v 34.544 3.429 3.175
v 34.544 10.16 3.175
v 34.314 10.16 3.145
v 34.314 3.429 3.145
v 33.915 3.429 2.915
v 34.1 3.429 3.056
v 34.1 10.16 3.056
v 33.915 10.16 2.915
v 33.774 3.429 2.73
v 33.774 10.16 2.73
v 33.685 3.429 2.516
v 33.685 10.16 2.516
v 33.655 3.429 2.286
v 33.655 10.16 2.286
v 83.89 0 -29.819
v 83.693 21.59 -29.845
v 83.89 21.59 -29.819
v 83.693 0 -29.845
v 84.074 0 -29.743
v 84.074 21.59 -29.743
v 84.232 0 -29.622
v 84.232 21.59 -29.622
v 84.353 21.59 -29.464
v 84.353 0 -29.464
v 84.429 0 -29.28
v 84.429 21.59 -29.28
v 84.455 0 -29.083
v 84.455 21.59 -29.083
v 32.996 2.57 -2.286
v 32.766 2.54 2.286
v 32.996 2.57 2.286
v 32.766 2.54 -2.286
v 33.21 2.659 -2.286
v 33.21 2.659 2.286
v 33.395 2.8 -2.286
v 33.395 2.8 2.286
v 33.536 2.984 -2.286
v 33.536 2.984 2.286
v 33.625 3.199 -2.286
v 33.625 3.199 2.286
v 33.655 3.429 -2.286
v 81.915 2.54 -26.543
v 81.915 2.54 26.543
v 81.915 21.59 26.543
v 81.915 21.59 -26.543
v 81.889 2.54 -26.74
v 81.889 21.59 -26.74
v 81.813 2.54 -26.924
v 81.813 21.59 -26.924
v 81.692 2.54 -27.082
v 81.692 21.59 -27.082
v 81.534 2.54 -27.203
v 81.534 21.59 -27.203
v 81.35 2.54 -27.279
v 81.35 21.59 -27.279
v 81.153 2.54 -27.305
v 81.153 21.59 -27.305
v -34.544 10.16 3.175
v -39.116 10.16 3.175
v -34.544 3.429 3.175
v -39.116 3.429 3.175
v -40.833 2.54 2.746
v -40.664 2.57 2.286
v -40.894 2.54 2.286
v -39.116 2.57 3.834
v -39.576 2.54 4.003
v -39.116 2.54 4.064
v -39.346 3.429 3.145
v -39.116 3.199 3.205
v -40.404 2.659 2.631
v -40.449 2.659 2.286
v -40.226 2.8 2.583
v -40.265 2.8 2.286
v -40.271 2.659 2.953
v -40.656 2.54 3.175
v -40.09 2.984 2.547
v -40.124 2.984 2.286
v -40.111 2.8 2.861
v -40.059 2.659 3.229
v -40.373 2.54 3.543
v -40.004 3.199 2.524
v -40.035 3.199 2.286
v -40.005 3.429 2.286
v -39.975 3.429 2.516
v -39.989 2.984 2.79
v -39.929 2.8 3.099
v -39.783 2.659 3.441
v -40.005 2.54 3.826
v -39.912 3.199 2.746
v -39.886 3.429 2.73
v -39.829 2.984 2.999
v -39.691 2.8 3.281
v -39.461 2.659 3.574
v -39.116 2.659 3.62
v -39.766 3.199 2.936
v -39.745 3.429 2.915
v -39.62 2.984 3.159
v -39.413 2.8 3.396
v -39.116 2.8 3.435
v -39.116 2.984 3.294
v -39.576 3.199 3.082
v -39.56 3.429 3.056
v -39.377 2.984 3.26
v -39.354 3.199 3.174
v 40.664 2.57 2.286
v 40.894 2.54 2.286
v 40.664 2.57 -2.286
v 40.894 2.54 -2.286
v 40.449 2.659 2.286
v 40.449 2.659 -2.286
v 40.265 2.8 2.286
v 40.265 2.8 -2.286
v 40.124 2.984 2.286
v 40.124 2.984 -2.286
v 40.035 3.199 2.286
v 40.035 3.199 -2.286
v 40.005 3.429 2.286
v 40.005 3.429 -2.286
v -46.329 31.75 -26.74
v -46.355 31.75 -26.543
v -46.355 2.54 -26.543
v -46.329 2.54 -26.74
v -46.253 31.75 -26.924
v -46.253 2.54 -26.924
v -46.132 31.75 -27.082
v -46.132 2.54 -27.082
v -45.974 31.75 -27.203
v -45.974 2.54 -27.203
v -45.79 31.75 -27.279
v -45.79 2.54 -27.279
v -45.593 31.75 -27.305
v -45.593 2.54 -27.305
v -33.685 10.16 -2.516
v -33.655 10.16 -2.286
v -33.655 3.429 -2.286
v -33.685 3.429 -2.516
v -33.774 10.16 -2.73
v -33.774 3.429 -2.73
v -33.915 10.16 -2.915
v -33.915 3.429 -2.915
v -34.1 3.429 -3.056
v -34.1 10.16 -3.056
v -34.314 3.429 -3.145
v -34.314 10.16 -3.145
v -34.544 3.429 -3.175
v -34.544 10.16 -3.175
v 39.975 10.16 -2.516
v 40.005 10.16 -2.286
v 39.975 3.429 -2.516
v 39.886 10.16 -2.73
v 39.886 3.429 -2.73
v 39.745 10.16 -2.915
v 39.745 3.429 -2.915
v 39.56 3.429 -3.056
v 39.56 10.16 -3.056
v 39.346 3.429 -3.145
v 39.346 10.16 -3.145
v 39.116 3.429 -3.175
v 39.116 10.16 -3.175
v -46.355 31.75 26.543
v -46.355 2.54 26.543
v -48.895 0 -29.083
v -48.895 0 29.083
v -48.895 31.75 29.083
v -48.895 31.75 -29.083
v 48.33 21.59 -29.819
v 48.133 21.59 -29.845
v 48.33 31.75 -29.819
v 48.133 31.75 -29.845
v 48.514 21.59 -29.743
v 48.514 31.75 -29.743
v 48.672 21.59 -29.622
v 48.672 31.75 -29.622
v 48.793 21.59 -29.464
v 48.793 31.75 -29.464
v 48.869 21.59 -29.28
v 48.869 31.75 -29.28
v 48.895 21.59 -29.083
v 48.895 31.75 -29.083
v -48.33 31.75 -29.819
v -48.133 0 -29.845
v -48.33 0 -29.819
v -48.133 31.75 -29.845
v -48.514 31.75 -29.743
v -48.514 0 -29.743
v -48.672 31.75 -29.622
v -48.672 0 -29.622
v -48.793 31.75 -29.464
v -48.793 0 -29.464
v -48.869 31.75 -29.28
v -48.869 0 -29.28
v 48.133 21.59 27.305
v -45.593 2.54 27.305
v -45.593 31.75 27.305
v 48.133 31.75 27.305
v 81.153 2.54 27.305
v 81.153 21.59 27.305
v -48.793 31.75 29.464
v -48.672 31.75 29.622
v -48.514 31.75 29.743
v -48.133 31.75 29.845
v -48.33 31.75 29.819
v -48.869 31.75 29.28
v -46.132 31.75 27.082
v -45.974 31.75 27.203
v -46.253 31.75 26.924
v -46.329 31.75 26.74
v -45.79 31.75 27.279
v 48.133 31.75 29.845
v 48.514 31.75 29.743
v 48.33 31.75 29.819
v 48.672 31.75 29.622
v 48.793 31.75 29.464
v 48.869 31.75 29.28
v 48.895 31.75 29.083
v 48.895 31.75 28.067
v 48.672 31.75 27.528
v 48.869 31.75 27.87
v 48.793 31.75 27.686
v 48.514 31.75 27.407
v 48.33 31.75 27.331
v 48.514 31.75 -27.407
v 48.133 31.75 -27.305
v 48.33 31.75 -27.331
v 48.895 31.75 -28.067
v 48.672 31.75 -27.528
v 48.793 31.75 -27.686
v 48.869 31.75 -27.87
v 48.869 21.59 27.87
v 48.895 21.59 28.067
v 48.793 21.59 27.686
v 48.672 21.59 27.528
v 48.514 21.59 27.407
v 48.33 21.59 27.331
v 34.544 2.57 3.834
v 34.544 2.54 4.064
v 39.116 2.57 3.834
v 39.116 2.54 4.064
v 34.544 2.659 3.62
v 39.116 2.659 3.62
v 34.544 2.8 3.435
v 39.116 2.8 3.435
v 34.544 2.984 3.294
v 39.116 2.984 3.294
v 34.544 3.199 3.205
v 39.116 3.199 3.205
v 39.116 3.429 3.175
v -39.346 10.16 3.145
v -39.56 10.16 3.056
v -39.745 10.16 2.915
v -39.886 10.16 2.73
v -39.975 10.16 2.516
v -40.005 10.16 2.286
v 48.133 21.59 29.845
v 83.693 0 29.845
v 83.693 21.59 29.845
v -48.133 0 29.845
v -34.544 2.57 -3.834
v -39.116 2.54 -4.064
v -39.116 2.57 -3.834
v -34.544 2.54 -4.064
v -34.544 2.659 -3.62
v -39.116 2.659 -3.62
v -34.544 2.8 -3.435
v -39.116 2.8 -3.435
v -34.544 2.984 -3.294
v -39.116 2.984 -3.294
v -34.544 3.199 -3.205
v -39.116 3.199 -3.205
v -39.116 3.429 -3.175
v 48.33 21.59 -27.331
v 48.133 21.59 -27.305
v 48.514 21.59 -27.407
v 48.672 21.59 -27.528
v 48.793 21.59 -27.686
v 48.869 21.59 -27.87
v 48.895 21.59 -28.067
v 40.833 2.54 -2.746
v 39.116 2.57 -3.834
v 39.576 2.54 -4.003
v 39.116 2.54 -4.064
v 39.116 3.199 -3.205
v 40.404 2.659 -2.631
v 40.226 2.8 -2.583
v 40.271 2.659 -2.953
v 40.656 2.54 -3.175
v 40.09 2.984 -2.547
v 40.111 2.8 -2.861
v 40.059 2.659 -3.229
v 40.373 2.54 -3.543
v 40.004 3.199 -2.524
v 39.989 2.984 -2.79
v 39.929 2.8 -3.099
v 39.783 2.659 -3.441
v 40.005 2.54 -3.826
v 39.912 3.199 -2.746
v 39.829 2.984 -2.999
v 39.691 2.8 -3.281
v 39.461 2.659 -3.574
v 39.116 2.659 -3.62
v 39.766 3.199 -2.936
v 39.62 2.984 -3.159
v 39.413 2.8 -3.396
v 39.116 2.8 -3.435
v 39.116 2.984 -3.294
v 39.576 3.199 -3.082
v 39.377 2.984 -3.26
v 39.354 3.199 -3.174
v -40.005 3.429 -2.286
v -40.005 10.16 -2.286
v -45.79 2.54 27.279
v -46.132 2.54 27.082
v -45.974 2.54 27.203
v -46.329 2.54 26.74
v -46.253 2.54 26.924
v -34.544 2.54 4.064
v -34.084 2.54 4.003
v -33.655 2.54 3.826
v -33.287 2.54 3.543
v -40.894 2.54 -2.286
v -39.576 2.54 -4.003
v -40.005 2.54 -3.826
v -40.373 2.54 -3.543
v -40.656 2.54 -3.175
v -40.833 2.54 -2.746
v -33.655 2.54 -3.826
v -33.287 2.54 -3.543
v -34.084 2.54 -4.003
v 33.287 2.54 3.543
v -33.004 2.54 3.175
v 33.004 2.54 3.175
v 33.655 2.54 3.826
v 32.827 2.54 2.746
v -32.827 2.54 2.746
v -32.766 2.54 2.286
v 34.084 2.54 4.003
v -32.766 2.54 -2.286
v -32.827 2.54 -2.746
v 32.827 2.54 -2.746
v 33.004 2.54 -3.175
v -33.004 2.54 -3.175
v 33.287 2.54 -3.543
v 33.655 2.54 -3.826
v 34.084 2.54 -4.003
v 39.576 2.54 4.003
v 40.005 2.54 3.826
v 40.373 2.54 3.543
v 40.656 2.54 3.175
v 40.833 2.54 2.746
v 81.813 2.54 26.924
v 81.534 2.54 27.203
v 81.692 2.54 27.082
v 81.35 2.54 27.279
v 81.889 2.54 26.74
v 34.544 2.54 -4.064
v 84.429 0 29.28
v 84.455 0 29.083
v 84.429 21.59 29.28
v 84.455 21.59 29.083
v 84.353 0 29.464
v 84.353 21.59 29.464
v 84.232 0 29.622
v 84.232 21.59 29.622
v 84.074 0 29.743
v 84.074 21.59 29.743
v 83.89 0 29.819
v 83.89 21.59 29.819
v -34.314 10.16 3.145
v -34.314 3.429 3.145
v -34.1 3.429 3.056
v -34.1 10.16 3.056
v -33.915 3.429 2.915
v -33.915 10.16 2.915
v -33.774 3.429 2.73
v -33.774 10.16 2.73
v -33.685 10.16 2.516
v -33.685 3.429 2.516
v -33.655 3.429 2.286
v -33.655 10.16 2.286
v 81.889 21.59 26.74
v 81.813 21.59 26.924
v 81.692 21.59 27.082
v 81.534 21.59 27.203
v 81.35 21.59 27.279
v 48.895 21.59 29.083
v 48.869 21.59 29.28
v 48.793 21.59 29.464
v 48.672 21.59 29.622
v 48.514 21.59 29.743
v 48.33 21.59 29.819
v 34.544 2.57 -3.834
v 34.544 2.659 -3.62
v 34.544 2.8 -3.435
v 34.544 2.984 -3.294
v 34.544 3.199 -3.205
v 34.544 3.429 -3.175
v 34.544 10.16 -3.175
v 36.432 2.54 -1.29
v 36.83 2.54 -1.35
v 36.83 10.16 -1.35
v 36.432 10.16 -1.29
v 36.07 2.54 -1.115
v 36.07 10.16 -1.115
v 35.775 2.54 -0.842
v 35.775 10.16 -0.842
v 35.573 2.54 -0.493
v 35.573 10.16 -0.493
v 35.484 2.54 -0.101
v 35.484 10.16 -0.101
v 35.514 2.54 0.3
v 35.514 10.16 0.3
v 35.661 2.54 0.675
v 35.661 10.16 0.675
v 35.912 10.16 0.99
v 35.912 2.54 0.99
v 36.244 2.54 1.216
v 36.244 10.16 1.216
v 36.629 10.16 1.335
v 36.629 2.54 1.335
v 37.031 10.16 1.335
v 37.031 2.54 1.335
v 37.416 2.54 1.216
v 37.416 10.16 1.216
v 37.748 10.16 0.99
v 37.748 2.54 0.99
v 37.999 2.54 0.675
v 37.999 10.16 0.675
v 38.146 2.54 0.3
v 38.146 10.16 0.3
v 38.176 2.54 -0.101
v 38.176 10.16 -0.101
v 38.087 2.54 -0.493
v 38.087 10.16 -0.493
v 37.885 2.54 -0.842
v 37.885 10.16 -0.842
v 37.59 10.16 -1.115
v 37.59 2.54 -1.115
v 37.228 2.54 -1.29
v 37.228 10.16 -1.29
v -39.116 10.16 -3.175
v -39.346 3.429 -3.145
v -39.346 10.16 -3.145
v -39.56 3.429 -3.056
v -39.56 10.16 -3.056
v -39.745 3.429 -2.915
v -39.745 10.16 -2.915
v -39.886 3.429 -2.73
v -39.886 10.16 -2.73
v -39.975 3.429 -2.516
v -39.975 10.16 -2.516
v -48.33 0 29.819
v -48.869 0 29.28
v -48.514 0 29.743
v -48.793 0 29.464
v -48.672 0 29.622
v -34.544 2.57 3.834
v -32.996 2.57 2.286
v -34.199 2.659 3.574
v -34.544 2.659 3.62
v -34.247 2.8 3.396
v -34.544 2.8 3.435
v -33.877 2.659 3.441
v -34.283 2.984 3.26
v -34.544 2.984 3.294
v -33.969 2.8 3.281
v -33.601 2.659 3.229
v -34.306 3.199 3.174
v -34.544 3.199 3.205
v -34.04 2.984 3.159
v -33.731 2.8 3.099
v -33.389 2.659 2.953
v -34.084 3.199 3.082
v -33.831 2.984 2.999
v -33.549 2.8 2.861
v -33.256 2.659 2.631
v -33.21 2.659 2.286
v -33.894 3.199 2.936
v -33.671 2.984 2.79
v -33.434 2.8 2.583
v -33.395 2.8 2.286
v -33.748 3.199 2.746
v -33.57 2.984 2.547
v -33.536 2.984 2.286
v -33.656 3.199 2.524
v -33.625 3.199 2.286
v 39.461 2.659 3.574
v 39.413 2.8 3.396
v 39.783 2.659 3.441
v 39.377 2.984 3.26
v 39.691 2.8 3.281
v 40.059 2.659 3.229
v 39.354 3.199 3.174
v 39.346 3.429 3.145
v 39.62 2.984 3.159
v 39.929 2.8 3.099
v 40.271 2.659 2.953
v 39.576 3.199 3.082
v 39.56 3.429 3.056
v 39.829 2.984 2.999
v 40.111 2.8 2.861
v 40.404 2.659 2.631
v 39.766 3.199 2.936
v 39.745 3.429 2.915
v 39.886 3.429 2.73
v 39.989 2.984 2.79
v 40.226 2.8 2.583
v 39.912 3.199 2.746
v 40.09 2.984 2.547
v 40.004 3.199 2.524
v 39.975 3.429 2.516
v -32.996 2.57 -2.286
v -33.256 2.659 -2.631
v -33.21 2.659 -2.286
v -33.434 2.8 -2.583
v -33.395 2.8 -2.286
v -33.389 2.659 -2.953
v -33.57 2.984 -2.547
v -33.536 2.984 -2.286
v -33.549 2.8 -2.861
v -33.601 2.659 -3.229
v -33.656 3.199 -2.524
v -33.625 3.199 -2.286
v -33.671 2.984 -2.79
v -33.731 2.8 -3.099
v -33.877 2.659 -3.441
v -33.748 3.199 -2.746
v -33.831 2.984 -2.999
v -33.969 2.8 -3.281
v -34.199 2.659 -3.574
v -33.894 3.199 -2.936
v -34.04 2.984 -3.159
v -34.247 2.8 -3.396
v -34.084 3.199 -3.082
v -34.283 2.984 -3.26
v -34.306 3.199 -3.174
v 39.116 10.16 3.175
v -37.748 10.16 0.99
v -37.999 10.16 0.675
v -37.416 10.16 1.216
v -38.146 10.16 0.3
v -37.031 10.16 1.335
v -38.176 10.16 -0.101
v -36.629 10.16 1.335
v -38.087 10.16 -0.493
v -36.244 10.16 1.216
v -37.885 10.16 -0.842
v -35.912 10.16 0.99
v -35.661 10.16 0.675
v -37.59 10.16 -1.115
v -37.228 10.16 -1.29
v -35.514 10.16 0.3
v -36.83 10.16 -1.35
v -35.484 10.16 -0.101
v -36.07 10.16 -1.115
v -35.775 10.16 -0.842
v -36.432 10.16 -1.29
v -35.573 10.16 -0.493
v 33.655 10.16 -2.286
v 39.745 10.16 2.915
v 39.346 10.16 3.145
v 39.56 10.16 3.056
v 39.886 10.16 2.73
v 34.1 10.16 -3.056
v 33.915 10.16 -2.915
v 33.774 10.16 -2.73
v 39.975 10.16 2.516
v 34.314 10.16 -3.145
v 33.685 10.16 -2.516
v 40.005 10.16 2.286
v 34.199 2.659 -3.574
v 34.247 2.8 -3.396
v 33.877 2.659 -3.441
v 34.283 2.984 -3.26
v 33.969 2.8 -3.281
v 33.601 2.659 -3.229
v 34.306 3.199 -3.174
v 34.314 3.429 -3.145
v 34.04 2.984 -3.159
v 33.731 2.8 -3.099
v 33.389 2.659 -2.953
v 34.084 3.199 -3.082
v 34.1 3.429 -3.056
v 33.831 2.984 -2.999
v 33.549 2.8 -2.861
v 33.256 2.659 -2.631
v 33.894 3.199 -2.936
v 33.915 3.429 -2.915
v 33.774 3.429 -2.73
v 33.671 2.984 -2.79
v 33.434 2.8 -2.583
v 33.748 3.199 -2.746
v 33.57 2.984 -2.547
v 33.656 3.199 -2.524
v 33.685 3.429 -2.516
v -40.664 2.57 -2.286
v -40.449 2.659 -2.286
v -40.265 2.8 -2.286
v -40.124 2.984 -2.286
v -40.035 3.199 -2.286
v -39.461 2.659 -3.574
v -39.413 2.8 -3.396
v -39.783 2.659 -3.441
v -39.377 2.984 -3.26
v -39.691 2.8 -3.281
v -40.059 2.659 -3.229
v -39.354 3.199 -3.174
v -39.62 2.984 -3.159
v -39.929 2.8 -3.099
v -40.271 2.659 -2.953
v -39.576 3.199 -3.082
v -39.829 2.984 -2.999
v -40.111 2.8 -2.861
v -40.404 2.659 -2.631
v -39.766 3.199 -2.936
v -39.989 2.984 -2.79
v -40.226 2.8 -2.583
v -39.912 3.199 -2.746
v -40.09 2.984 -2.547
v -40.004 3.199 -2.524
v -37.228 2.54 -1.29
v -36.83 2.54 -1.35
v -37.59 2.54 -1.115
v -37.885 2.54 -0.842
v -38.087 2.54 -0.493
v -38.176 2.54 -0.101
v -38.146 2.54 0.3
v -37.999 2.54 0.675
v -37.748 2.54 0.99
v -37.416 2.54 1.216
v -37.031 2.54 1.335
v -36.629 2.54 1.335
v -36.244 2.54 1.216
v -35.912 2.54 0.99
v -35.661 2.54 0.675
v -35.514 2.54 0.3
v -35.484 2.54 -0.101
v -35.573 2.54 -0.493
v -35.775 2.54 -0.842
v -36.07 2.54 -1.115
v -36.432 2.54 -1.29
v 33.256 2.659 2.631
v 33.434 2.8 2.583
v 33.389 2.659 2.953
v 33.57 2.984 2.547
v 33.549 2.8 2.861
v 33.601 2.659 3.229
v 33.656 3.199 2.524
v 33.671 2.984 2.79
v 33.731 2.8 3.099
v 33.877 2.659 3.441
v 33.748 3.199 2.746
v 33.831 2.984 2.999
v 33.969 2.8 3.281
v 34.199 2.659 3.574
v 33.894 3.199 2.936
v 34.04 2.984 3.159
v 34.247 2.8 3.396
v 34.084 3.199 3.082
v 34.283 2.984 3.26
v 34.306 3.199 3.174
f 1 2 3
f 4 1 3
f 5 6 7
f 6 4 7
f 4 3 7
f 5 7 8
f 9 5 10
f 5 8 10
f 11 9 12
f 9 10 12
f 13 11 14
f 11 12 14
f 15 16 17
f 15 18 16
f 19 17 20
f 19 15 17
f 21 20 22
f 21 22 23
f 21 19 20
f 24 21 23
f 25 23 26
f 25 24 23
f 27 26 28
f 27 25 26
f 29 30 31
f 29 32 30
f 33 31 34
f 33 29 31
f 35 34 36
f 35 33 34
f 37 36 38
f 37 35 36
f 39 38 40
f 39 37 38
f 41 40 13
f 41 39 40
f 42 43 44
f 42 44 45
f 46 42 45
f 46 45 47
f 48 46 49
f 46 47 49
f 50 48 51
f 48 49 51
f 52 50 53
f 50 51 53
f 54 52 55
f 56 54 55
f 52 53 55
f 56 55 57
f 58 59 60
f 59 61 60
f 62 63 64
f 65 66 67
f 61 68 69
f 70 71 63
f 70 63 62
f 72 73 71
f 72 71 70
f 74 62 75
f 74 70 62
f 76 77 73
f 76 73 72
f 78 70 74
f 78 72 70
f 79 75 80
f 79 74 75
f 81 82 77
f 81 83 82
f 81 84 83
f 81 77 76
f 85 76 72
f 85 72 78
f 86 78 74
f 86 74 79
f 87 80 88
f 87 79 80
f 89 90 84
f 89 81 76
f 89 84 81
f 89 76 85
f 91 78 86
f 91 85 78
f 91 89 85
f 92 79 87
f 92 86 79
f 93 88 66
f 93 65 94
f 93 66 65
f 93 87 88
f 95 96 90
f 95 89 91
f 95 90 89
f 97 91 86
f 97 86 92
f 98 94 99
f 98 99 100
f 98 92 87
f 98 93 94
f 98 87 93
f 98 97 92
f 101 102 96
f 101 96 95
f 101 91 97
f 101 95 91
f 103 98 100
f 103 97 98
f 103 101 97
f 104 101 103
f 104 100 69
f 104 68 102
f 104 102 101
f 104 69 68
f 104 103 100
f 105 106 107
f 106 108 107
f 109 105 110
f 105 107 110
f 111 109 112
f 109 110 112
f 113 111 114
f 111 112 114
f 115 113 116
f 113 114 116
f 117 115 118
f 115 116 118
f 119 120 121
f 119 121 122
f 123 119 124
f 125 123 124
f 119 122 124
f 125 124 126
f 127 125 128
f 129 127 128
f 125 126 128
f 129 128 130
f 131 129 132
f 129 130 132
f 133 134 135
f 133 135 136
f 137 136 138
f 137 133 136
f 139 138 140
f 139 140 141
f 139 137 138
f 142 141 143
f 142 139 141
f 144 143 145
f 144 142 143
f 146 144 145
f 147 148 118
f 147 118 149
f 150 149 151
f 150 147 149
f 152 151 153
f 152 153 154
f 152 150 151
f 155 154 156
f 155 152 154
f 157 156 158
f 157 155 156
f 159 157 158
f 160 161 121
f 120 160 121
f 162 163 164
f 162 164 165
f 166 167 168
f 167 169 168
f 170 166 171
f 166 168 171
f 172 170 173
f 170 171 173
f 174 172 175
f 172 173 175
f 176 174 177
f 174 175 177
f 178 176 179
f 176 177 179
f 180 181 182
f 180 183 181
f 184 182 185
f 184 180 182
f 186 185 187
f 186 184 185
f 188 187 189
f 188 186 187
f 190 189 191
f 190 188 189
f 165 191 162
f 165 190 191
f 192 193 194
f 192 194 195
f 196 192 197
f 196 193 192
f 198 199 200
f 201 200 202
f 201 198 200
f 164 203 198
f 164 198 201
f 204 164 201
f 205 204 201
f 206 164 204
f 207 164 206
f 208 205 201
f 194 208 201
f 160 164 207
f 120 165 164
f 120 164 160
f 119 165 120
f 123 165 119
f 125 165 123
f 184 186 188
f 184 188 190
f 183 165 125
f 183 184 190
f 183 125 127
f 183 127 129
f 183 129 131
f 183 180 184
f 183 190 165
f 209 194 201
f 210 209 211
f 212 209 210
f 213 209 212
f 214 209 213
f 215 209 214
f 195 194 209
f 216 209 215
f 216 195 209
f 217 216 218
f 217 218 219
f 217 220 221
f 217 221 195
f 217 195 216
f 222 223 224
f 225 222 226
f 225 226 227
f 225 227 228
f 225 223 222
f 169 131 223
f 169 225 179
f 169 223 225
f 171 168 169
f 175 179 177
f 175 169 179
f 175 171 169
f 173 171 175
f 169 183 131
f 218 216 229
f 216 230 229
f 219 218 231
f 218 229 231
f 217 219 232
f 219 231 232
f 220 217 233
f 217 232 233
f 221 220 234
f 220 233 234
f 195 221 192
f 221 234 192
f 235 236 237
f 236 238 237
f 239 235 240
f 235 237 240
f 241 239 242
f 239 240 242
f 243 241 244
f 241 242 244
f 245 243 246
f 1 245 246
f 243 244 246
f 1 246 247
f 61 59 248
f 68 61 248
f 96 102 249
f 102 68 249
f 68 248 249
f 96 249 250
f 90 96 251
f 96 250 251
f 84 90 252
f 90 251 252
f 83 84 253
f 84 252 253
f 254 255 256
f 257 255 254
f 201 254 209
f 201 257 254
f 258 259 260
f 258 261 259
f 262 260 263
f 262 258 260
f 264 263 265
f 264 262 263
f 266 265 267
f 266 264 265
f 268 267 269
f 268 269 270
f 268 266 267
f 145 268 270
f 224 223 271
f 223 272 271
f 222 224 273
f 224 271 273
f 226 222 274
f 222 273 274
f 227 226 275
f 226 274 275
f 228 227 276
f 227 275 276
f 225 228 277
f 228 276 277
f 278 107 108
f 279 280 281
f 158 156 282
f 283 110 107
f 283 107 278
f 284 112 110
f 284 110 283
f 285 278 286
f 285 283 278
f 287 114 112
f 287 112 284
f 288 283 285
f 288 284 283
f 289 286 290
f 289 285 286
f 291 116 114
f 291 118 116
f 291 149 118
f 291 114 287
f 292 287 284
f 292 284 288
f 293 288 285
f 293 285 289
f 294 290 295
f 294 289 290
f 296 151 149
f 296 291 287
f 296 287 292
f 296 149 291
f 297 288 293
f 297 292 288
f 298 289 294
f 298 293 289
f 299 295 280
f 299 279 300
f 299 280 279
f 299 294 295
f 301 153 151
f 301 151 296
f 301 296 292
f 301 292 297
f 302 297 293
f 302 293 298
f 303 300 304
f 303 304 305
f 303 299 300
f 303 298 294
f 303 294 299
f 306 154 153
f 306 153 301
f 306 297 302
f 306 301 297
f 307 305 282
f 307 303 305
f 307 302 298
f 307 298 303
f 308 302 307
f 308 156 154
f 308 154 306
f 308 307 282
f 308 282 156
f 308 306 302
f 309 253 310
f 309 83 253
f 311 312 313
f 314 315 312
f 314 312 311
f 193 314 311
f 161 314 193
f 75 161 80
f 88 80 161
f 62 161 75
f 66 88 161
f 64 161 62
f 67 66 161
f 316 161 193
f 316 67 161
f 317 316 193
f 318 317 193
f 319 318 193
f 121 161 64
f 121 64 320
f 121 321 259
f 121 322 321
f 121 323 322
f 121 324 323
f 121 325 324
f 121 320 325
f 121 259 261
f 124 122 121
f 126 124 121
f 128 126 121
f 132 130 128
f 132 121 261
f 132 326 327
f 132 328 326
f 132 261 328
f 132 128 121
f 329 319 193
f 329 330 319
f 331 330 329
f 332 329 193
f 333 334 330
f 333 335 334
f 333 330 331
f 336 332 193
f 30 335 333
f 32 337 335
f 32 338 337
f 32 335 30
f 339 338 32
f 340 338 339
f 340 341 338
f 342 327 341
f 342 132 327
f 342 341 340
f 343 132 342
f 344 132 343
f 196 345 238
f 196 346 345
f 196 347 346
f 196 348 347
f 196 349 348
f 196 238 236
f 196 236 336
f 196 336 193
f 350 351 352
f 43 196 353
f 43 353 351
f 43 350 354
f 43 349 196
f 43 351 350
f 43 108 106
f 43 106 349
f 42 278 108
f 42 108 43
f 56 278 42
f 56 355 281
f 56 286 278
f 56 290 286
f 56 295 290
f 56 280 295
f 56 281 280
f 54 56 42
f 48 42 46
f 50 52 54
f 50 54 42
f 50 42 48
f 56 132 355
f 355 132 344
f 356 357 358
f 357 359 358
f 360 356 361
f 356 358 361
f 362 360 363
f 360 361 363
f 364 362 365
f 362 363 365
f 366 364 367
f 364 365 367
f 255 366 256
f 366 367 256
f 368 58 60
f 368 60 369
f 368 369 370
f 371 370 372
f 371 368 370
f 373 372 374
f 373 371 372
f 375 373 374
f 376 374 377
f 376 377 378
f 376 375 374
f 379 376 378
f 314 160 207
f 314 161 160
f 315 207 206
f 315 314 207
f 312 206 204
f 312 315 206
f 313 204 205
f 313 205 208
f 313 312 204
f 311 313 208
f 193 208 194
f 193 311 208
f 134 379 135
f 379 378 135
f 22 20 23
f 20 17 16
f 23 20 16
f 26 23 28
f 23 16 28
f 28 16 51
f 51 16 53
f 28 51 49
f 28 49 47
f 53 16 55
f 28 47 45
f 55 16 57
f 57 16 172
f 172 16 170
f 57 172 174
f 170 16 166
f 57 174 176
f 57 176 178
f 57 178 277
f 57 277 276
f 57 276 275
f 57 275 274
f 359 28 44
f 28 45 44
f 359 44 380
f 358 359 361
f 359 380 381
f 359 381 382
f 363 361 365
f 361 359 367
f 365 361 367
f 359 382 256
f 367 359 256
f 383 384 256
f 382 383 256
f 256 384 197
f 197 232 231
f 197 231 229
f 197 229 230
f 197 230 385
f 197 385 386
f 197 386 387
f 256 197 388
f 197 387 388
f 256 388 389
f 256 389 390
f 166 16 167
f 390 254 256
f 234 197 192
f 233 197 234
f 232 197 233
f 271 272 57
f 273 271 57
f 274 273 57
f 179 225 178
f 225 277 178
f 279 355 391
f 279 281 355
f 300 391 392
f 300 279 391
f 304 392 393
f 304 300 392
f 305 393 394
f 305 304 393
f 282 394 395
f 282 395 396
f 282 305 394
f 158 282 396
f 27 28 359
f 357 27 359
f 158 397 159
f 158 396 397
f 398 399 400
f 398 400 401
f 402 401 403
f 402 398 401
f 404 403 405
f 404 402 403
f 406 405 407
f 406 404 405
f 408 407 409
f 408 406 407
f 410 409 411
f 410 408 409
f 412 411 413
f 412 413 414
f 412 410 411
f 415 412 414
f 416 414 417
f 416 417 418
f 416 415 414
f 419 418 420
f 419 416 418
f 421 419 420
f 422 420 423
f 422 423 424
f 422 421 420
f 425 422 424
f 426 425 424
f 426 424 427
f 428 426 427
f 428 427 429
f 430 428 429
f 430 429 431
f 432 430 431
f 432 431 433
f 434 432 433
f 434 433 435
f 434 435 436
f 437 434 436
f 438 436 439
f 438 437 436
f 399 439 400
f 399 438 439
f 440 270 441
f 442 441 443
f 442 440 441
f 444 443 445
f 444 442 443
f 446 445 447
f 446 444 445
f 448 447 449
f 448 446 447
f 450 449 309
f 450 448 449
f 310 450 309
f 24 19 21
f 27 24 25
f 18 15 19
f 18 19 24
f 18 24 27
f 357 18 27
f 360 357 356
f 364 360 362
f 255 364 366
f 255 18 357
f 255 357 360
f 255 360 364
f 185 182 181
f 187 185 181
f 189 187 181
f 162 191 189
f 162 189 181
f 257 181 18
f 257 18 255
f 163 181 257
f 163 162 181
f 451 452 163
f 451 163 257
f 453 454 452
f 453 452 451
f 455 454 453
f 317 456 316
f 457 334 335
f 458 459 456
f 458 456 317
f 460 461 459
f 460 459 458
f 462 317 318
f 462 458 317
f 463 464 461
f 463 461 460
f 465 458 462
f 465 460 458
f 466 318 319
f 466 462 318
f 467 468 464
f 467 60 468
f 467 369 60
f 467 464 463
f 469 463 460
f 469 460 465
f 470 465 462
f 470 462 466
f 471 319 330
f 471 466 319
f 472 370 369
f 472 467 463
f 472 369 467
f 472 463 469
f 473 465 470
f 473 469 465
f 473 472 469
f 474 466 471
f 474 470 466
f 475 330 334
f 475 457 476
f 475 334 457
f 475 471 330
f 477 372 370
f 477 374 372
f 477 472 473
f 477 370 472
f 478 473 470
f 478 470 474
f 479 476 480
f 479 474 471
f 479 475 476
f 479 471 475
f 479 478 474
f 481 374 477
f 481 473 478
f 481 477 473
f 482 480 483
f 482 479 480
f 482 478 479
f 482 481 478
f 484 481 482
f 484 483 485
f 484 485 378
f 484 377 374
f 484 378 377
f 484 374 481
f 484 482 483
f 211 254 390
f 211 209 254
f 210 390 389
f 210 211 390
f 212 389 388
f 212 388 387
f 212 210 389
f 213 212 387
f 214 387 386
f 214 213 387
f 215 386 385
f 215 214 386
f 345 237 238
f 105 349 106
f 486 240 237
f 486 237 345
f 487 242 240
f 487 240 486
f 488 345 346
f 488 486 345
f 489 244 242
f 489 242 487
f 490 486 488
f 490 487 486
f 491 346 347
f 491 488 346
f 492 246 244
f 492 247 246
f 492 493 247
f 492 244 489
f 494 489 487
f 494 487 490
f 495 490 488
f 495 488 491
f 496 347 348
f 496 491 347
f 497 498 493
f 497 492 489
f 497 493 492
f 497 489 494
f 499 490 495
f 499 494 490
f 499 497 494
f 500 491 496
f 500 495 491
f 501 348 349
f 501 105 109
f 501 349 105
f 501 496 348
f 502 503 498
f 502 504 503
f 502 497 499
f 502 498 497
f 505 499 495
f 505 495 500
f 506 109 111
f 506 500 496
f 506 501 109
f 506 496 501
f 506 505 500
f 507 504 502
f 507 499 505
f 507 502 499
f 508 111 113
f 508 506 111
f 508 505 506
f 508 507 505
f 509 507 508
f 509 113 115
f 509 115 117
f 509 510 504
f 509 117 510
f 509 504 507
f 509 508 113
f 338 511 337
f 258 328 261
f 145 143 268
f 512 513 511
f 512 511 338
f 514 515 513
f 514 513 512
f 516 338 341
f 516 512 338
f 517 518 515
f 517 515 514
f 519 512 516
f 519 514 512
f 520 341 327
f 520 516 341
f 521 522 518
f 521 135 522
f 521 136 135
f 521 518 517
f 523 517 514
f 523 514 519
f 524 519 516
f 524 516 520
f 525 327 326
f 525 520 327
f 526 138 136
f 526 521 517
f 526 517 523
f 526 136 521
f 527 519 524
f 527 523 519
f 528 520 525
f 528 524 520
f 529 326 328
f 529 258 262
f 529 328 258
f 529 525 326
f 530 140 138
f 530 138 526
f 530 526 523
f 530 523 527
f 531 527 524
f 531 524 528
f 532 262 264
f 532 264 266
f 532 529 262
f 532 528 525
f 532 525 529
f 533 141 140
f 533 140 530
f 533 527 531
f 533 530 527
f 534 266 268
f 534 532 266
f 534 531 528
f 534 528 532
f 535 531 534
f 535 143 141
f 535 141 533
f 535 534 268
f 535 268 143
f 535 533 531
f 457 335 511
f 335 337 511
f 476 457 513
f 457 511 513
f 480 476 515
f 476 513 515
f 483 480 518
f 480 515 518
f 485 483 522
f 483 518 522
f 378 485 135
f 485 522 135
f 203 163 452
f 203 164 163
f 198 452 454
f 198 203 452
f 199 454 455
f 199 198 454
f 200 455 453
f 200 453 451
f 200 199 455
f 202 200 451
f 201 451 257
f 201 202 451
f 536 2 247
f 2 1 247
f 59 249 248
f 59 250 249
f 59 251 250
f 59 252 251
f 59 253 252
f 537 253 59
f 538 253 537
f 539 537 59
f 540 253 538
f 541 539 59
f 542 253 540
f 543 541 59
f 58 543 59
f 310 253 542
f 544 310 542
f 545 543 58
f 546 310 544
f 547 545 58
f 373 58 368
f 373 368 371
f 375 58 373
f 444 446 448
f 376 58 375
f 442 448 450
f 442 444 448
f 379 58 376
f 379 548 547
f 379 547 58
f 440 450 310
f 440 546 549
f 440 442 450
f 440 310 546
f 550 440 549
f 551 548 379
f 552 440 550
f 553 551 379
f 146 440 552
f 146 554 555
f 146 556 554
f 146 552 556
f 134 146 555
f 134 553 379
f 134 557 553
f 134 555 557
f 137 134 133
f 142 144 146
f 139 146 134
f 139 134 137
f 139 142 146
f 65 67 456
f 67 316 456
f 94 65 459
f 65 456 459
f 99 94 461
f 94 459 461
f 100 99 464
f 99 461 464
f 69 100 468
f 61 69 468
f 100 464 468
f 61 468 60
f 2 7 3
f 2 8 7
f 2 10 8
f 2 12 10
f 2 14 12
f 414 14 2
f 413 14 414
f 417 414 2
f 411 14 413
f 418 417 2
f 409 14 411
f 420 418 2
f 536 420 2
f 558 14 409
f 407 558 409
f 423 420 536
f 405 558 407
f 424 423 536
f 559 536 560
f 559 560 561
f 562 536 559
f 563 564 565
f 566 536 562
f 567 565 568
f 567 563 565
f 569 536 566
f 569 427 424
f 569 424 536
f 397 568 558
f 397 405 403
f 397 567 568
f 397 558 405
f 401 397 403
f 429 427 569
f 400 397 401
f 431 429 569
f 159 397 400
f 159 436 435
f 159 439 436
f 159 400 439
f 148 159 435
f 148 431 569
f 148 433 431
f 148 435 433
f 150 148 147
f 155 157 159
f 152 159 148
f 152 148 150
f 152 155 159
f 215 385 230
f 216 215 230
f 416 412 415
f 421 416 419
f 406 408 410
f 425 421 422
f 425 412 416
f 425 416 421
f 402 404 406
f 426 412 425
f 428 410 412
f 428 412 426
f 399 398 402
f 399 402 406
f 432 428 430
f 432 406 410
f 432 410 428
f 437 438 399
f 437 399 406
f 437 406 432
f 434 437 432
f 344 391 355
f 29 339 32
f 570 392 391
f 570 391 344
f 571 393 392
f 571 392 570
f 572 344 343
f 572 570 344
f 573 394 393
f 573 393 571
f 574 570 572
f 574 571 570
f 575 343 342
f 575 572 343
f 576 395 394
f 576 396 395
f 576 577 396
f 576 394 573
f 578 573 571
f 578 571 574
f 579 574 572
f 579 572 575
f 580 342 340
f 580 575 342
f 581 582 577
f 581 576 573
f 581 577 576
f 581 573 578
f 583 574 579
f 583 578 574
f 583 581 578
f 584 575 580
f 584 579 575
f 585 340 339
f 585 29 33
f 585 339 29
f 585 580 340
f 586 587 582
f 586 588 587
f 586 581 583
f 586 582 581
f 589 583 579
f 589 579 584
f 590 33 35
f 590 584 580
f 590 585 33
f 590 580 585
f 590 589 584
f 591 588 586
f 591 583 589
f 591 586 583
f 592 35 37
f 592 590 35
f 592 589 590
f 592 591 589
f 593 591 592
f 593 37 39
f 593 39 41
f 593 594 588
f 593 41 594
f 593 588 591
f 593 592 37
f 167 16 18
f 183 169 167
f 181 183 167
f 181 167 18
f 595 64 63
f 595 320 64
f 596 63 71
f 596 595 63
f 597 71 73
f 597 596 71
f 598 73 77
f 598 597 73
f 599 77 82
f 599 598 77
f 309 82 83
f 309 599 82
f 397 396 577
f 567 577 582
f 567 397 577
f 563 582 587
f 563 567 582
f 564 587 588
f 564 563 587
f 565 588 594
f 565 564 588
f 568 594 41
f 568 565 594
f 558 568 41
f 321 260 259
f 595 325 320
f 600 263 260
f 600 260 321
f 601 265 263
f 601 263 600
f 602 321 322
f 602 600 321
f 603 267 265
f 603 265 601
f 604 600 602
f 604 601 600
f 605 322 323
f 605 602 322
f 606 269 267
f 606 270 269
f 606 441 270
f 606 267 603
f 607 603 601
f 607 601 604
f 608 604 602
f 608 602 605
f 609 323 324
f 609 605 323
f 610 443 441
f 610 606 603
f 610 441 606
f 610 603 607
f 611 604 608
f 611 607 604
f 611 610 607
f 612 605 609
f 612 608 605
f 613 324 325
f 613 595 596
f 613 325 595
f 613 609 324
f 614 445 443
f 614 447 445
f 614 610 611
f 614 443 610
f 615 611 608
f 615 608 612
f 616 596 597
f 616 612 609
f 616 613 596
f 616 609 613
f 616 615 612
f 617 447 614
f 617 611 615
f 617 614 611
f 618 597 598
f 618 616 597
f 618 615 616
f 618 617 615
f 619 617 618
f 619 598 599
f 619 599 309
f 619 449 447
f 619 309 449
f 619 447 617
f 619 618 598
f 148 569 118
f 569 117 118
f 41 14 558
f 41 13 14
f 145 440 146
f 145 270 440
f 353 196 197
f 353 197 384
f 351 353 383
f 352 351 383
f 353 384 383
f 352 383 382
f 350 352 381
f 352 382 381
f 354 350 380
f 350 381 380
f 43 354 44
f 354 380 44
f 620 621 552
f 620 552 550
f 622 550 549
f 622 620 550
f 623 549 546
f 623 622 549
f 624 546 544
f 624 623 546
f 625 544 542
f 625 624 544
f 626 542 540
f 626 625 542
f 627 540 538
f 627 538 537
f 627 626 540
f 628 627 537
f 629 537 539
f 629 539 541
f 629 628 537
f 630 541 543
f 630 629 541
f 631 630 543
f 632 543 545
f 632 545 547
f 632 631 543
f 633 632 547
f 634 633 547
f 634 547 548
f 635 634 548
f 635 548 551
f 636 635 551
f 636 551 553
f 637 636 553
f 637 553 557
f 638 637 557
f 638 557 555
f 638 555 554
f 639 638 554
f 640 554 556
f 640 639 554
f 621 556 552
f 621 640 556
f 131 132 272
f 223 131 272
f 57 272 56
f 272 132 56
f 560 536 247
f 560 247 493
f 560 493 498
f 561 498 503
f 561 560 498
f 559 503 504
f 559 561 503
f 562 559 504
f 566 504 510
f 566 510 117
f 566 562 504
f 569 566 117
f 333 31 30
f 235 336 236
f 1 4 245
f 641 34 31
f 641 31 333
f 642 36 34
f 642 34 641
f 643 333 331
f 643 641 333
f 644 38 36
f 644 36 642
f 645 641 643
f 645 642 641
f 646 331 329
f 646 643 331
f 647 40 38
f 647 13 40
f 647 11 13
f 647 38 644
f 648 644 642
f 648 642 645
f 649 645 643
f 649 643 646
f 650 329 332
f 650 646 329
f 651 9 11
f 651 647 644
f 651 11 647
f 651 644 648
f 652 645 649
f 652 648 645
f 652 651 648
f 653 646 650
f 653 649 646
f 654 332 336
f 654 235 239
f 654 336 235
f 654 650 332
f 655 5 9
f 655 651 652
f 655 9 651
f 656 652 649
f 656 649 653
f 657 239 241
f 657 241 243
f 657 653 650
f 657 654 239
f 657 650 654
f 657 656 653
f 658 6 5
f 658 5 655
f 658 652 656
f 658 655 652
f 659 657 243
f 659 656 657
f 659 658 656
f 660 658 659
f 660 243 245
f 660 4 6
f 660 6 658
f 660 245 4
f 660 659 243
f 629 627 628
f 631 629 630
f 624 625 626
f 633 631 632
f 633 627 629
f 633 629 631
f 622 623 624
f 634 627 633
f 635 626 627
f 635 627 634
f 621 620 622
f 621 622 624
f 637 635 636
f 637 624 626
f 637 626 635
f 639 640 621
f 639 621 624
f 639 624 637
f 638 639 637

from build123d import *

# Parameters (mm, degrees)
SKETCH1_W           = 97.79
SKETCH1_H           = 59.69
BOSS_EXTRUDE1_DEPTH = 31.75
SHELL1_T            = -2.54
SKETCH2_W           = 6.35
SKETCH2_H           = 6.35
SKETCH2_R           = 1.35
BOSS_EXTRUDE2_DEPTH = 7.62
FILLET2_R           = 0.889
BOSS_EXTRUDE3_DEPTH = 35.56
SHELL2_START        = 2.54
SHELL2_OUTLINE_W    = 33.02
SHELL2_OUTLINE_H    = 54.61
SHELL2_DEPTH        = 19.05
FILLET3_R           = 0.762


# Read off the part's stored shape, not the designer's step: Shell2
with BuildPart() as part:
    # Sketch1 → Boss-Extrude1 (new body)
    with BuildSketch(Plane(origin=(0, 0, 0), x_dir=(1, 0, 0), z_dir=(0, 1, 0))):
        Rectangle(SKETCH1_W, SKETCH1_H)
    extrude(amount=BOSS_EXTRUDE1_DEPTH)

    # Shell1
    shell1_openings = [part.faces().sort_by_distance(p)[0] for p in [
        (0, 31.75, 0),
        (48.895, 15.875, 0),
    ]]
    offset(amount=SHELL1_T, openings=shell1_openings, kind=Kind.INTERSECTION)

    # Sketch2 → Boss-Extrude2 (add)
    # profile 1 of 2: a face of its own
    with BuildSketch(Plane(origin=(0, 2.54, 0), x_dir=(1, 0, 0), z_dir=(0, 1, 0))):
        with Locations((-36.83, 0)):
            Rectangle(SKETCH2_W, SKETCH2_H)
        with Locations(Location((-36.83, 0, 0), (0, 0, 90))):
            Circle(SKETCH2_R, mode=Mode.SUBTRACT)
    # profile 2 of 2: a face of its own
    with BuildSketch(Plane(origin=(0, 2.54, 0), x_dir=(1, 0, 0), z_dir=(0, 1, 0))):
        with Locations((36.83, 0)):
            Rectangle(SKETCH2_W, SKETCH2_H)
        with Locations(Location((36.83, 0, 0), (0, 0, 90))):
            Circle(SKETCH2_R, mode=Mode.SUBTRACT)
    extrude(amount=BOSS_EXTRUDE2_DEPTH)

    # Fillet2
    fillet2_edges = [part.edges().sort_by_distance(p)[0] for p in [
        (-33.655, 2.54, 0),
        (-33.655, 6.35, 3.175),
        (-36.83, 2.54, -3.175),
        (-33.655, 6.35, -3.175),
        (-40.005, 2.54, 0),
        (-40.005, 6.35, -3.175),
        (-36.83, 2.54, 3.175),
        (-40.005, 6.35, 3.175),
        (33.655, 2.54, 0),
        (33.655, 6.35, -3.175),
        (36.83, 2.54, 3.175),
        (33.655, 6.35, 3.175),
        (40.005, 2.54, 0),
        (40.005, 6.35, 3.175),
        (36.83, 2.54, -3.175),
        (40.005, 6.35, -3.175),
    ]]
    fillet(fillet2_edges, radius=FILLET2_R)

    # Sketch4 → Boss-Extrude3 (add)
    with BuildSketch(Plane(origin=(48.895, 0, 0), x_dir=(0, 0, -1), z_dir=(1, 0, 0))):
        Polygon((-29.845, 21.59), (-27.305, 21.59), (27.305, 21.59), (29.845, 21.59), (29.845, 0), (-29.845, 0), align=None)
    extrude(amount=BOSS_EXTRUDE3_DEPTH)

    # Shell2 outline → Shell2 (cut)
    with BuildSketch(Plane(origin=(0, 0, 0), x_dir=(1, 0, 0), z_dir=(0, 1, 0)).offset(SHELL2_START)):
        with Locations((65.405, 0)):
            Rectangle(SHELL2_OUTLINE_W, SHELL2_OUTLINE_H)
    extrude(amount=SHELL2_DEPTH, mode=Mode.SUBTRACT)

    # Fillet3
    fillet3_edges = [part.edges().sort_by_distance(p)[0] for p in [
        (84.455, 10.795, 29.845),
        (84.455, 10.795, -29.845),
        (81.915, 12.065, 27.305),
        (81.915, 12.065, -27.305),
        (-46.355, 17.145, -27.305),
        (-46.355, 17.145, 27.305),
        (48.895, 26.67, 27.305),
        (48.895, 26.67, -27.305),
        (-48.895, 15.875, -29.845),
        (48.895, 26.67, -29.845),
        (48.895, 26.67, 29.845),
        (-48.895, 15.875, 29.845),
    ]]
    fillet(fillet3_edges, radius=FILLET3_R)


solid = part.part
